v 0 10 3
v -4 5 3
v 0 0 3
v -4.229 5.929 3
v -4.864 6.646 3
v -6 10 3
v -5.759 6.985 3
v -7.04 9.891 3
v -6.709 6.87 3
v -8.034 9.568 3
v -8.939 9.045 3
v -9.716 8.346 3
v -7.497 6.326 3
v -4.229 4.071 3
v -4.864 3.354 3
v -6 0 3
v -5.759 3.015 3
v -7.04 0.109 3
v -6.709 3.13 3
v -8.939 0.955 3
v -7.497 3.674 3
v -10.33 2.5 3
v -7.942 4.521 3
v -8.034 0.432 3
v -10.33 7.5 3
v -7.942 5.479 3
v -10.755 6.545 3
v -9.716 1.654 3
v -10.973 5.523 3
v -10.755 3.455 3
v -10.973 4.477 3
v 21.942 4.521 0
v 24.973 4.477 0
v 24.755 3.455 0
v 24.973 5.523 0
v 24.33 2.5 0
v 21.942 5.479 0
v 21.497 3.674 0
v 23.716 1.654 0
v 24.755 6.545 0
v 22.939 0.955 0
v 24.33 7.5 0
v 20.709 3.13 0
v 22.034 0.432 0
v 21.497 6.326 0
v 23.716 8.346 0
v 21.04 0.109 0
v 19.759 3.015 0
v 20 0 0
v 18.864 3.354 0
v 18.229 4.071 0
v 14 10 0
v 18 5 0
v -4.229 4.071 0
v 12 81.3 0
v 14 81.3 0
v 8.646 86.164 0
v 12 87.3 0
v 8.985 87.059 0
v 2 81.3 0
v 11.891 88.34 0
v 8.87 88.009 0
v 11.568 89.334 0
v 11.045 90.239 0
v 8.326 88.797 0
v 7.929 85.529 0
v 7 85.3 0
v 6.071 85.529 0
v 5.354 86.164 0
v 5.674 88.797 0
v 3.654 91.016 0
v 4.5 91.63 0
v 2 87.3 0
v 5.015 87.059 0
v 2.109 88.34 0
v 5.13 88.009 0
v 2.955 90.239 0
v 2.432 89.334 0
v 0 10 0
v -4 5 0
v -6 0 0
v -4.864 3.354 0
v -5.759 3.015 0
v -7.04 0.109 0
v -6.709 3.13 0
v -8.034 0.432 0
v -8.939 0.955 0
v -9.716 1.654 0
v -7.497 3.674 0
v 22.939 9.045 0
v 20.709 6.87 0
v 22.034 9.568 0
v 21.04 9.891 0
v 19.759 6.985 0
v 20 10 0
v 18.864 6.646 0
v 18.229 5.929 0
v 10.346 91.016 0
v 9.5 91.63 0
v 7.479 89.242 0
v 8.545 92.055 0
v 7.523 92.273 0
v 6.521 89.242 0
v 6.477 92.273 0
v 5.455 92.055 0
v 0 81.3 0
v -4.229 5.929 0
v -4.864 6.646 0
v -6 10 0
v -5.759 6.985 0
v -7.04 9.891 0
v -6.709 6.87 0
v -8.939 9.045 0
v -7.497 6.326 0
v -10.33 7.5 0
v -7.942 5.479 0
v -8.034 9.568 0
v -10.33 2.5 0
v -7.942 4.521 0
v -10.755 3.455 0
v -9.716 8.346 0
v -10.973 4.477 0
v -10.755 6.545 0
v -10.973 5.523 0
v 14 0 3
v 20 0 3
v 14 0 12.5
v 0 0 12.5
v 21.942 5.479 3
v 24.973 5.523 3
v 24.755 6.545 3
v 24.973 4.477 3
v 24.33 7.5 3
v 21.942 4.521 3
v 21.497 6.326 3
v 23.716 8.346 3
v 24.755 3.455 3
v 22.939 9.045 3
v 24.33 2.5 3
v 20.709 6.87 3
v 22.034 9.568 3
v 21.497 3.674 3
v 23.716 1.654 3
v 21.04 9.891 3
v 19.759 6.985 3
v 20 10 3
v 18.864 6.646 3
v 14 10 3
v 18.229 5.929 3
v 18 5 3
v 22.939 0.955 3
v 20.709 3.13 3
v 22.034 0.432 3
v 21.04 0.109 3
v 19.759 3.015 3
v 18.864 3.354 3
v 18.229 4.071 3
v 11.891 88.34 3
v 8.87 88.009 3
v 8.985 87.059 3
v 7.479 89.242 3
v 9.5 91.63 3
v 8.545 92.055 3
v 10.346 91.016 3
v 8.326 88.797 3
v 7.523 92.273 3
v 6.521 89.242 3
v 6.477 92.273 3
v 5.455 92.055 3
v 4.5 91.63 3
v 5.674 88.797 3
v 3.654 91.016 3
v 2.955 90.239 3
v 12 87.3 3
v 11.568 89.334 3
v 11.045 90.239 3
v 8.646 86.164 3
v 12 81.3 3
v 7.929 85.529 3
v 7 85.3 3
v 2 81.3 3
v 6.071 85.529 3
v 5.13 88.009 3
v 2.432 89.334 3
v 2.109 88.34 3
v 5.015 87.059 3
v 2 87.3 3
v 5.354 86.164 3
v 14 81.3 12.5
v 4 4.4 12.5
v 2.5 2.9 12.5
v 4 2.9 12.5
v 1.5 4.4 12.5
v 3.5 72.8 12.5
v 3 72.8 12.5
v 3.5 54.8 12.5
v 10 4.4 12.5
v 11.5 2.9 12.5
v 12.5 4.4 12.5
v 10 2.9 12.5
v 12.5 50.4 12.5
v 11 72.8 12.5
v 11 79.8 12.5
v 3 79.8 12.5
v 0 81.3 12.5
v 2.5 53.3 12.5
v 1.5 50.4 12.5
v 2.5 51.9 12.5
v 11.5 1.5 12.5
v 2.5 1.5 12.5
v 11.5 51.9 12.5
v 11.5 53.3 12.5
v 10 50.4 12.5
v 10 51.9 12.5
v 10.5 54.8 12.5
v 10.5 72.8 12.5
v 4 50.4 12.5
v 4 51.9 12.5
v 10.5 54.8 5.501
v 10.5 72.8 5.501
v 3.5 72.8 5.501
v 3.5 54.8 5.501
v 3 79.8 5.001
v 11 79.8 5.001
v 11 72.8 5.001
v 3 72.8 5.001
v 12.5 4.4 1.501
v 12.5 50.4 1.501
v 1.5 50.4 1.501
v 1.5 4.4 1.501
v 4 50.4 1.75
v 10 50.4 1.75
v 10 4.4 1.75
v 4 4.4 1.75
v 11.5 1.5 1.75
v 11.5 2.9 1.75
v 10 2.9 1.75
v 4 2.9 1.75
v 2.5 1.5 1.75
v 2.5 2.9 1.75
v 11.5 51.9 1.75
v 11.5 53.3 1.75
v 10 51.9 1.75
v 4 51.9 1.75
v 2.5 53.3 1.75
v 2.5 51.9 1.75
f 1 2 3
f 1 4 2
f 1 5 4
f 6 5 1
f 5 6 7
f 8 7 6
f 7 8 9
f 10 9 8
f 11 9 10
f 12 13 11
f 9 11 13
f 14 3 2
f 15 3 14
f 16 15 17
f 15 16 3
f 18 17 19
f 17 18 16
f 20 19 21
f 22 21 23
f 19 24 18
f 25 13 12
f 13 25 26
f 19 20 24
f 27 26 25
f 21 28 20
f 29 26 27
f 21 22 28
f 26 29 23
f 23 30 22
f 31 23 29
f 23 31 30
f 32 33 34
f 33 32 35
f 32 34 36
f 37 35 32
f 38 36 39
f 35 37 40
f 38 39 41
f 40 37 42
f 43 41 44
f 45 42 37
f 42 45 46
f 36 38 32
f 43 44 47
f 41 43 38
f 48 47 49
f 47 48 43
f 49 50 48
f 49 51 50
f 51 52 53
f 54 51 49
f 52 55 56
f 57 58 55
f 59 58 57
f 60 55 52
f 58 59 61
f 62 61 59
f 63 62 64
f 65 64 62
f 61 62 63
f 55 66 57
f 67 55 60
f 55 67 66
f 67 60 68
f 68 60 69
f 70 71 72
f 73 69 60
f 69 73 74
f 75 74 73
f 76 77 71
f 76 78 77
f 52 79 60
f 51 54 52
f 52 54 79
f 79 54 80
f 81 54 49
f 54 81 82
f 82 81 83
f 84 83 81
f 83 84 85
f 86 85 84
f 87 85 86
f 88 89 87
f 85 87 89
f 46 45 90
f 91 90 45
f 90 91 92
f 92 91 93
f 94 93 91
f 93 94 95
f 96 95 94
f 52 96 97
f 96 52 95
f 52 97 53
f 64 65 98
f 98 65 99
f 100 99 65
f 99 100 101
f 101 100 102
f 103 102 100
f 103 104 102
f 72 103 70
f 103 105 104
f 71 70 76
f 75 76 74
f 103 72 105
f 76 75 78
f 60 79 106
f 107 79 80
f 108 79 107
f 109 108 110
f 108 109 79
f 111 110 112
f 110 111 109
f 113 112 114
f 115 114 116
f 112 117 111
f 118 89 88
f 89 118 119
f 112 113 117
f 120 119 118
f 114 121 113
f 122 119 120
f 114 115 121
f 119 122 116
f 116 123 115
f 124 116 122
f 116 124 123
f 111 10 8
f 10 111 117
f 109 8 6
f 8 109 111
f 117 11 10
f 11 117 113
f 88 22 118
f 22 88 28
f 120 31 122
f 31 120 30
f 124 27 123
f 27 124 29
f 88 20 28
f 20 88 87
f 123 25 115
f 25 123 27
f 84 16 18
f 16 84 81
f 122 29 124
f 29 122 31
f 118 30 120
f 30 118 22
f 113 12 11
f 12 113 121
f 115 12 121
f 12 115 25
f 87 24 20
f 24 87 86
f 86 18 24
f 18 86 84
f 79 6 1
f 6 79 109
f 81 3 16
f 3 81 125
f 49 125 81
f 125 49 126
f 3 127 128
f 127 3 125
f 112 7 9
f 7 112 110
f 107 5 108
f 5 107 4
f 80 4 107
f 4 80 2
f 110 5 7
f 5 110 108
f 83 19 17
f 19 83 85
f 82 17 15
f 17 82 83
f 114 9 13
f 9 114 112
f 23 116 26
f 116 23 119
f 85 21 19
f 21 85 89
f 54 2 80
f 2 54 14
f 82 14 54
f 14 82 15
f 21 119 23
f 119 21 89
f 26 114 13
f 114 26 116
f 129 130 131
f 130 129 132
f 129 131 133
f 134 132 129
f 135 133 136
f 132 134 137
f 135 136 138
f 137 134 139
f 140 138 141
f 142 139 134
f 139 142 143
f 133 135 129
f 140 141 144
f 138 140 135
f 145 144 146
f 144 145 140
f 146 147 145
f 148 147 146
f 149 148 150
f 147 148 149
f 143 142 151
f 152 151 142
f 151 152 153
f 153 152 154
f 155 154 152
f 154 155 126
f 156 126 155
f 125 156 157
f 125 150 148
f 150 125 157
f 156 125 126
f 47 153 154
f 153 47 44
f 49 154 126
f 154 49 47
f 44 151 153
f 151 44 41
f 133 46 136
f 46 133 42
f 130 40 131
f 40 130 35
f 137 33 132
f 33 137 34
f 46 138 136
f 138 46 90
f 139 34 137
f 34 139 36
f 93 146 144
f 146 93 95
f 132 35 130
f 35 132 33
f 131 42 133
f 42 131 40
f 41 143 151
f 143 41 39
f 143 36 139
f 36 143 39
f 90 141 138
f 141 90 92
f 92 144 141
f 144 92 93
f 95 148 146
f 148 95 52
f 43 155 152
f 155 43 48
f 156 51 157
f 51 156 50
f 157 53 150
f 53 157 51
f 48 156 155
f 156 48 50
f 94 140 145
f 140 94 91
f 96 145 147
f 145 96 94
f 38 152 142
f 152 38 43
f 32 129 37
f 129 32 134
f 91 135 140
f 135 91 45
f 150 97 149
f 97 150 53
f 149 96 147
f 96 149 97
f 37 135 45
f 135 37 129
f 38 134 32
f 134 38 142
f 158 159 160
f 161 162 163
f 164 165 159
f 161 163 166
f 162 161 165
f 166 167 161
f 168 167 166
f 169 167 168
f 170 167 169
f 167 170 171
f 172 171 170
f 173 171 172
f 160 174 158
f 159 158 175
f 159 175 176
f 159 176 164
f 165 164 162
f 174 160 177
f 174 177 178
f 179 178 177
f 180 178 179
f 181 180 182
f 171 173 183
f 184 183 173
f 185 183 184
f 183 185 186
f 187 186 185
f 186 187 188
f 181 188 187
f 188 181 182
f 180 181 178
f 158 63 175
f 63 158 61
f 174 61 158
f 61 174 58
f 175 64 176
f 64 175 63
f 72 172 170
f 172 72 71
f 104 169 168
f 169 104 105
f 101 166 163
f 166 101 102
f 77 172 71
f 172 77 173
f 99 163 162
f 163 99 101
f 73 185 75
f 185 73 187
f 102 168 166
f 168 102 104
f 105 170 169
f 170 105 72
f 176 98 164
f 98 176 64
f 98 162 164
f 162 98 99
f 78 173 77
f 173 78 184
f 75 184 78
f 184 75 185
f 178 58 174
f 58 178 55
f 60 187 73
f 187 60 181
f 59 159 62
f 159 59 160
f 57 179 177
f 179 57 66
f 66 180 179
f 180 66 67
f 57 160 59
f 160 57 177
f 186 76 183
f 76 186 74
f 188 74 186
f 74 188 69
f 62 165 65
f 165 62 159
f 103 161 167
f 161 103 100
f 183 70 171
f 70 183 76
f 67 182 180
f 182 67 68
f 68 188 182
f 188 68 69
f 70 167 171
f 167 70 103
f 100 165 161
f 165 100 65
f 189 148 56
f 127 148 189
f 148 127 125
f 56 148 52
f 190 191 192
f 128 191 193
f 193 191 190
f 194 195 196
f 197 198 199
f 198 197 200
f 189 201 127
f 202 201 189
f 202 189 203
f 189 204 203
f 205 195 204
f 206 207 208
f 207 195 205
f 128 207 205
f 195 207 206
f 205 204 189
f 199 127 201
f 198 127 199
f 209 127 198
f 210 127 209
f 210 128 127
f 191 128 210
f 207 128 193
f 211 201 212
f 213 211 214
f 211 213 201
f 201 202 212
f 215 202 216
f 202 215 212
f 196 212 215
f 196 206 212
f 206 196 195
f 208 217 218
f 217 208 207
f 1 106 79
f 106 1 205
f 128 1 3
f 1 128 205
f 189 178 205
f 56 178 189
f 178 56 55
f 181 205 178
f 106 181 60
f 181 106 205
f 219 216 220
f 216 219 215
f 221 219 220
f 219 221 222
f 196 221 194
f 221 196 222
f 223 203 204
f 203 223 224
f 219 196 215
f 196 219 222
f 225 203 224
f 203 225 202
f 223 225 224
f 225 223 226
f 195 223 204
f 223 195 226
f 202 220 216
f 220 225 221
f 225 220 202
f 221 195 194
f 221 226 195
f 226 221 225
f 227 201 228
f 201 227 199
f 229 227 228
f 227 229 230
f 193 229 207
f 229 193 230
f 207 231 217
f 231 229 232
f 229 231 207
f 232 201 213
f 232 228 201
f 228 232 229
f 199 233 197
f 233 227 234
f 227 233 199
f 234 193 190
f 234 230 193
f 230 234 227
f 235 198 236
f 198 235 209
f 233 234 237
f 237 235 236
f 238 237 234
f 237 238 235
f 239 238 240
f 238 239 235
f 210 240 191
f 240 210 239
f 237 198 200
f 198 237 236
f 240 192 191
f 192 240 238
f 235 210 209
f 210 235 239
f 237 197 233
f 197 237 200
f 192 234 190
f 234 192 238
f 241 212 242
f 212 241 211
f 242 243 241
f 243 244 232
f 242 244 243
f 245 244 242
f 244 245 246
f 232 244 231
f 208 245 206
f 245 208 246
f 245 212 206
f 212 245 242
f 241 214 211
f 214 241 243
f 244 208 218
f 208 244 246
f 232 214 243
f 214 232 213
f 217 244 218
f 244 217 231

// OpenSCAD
// file: common.scad
//include <RatsoShapeLibrary.scad>



/*
Define settings for each nut/bolt type here
*/

// ### layer height of the printer ###
printer_layer_height = 0.4;

// kludge factor for different print nozzles
printer_oversize = 0.5; // 0.35 nozzle use 0.3; 0.6 nozzle use 0.?
printer_oversizeArc = 0.2; // 0.35 nozzle = ???; 0.6 nozzle = 0.2


// ### M3 ###

M3_boltDiameter = 3.0 + printer_oversize; // actual 3.0
M3_boltDiameterArc = 3.0 + printer_oversizeArc; // used for rotary extruded bolt channel
M3_boltHeadDiameter = 6.0 + printer_oversize; // actual 6
M3_nutHeight = 2.4 + printer_oversize; // actual 2.4
M3_lockNutHeight = 4.0 + printer_oversize; // actual 4.0
M3_nutDiameterMin = 5.5 + printer_oversize; // actual 5.5
M3_nutDiameterMax = (5.5*(1/sin(60))) + printer_oversize; // actual 6
M3_nutDiameterArc = 5.5; // used for rotary extruded nut channel

// eventually standardize this interface??, that would allow for easy switching of bolt/nut sizes
M3_dim = [M3_boltDiameter,M3_nutDiameterMin,M3_nutDiameterMax,M3_nutHeight];


// ### M2 ###

M2_boltDiameter = 2.0 + printer_oversize; // actual 2.0
M2_boltHeadDiameter = 4.0 + printer_oversize; // actual 4
M2_nutHeight = 1.6 + printer_oversize; // actual 1.6
M2_nutDiameterMin = 3.8 + printer_oversize; // actual 4
M2_nutDiameterMax = (4.0*(1/sin(60))) + printer_oversize; // actual 4.5

// eventually standardize this interface??, that would allow for easy switching of bolt/nut sizes
M2_dim = [M2_boltDiameter,M2_nutDiameterMin,M2_nutDiameterMax,M2_nutHeight];

// ### M8 ###
M8_rodDiameter = 8 + printer_oversize;

// ### PI ###
pi = 3.14159265359;



// ### shaft sizes for tight fit ###
woodDowel_quarterInch_diameter = 7.1;
woodDowel_halfInch_diameter = 13.5;
stepperMotor_diameter = 5.0 + printer_oversize; // actual 5.0



//--------




// =========================================================

//trapNutDie(channelHeight=20, holeLength=50, holeOffset=15 );
//trapNutDie(channelHeight=0 ,holeLength=15, holeOffset=0, nutOffset=0 );
// ** this is a brand-new function
module trapNutDie(
	channelHeight=15, 
	holeLength=10, 
	holeOffset=0, 
	nutOffset=0, 
	boltHoleRes=12,
	boltRadius = M3_boltDiameter/2, // DEPRICATE
	mType = 0,
	boltDiameter = M3_boltDiameter,
	nutHeight = M3_nutHeight,
	nutDiameterMin = M3_nutDiameterMin,
	nutDiameterMax = M3_nutDiameterMax,
	horizontal = false // should add a support to the bolt hole, AND (###TODO###) make the nut height a little higher
	){

	if(!horizontal){
		// hex-hole for the nut
		translate([0,-(nutHeight/2),-nutOffset]) rotate([-90,30,0]) cylinder(r=nutDiameterMax/2, h=nutHeight, $fn=6);
		// channel the nut drops into
		translate([-nutDiameterMin/2,-(nutHeight/2),0]) cube([nutDiameterMin,nutHeight,channelHeight]);
	}else{
		// hex-hole for the nut
		translate([0,-(nutHeight/2),-nutOffset]) rotate([-90,30,0]) cylinder(r=nutDiameterMax/2, h=nutHeight+printer_layer_height, $fn=6);
		// channel the nut drops into
		translate([-nutDiameterMin/2,-(nutHeight/2),0]) cube([nutDiameterMin,nutHeight+printer_layer_height,channelHeight]);
	}

	difference(){
		// bolt hole
		translate([0,-(holeLength/2)+holeOffset,0]) rotate([-90,0,0]) cylinder(r=boltDiameter/2, h=holeLength, $fn=boltHoleRes);
		if(horizontal){
			// cutout slice for support (if horizontal)
			rotate([-90,0,0]) translate([0,0,(nutHeight/2)+0.001]) cylinder(r=(boltDiameter/2)+1, h=printer_layer_height*2);
		}
	}
	
}

// =================================

//stumpWithTrapNut(shaftDiameter=stepperMotor_diameter, stumpWallThick=6, nutBlockThick=12);
//stumpWithTrapNut(shaftDiameter=16 + printer_oversize ); // shaft collar for Chad's drum stand
//stumpWithTrapNut(shaftDiameter=woodDowel_halfInch_diameter, stumpWallThick=8, nutBlockThick=0);
//stumpWithTrapNut(shaftDiameter=woodDowel_quarterInch_diameter); // shaftDiameter was 7.3, but a little too loose


module stumpWithTrapNut(
	shaftDiameter = 7.3,
	stumpWallThick = 4,
	nutBlockThick = 8,
	){

	shaftRadius = shaftDiameter/2;
	stumpRadius = shaftRadius + stumpWallThick;
	stumpHeight = 10;

	nutBlockWidth = M3_nutDiameterMax+stumpWallThick;
	nutBlockOffsetY = stumpRadius + nutBlockThick - stumpWallThick;
	stumpTrapNutOffsetY = shaftRadius + ( max( stumpWallThick, nutBlockThick ) / 2.5 );  //nutBlockOffsetY - (nutBlockThick/2); //
	stumpTrapNutOffsetZ = stumpHeight/2;

	trapNutBoltHoleLength = max( nutBlockThick, stumpWallThick );

		// nut stump
			translate([0,0,0]) difference(){
				union(){
					// stump
					translate([0,0,0]) cylinder(r=stumpRadius, h=stumpHeight, center=false);
					// nut block
					translate([-nutBlockWidth/2,-nutBlockOffsetY,0]) cube([nutBlockWidth,nutBlockThick,stumpHeight]);
				}
				// motor shaft
				translate([0,0,(stumpHeight)/2]) cylinder(r=shaftRadius, h=stumpHeight+1, center=true, $fn=shaftDiameter*3);
				// trap nut
				rotate([0,0,0]) translate([0,-stumpTrapNutOffsetY, stumpHeight-stumpTrapNutOffsetZ]) rotate([0,0,0]) trapNutDie(channelHeight=10 ,holeLength=trapNutBoltHoleLength*2, holeOffset=(-trapNutBoltHoleLength)/2 ); //holeOffset=(length/2)+(r1/2)
			} // translate difference
}
// main file
include<RatsoShapeLibrary.scad>
include<common.scad>


bodyWallThick = 1.5;

aaaBatteryRadius = 5.5;
aaaBatteryLength = 46; // 44 for the battery + spring compression
aaaTerminalWidth = 9; // actual 8; width and height same
aaaTerminalThick = 1.4;
aaaTerminalTabWallWidth = 1.5; 
aaaTerminalTabWallThick = 1.5; 
//aaaTerminalTabThick = 1.5; // how thick the tab needs, though it does compress
//aaaTerminalTabOffset = 3; // from the edge

motorBodyDiameter = 7.0; // actual 7.0
motorBodyLength = 18; 
motorShaftDiameter = 8; // includes weight, etc. - total clearance
motorShaftLength = 7; // again, total clearance
motorOverallLength = motorBodyLength + motorShaftLength;


mountRingOR = 5;
mountRingIR = 2;
caseMountLoopHeight = 3;
caseMountLoopOffsetX = 6;
caseMountLoopOffsetY = mountRingOR;

vibroBotBodySizeOuter = [ 
	(aaaBatteryRadius*2)+(bodyWallThick*2), 
	bodyWallThick+aaaTerminalThick+aaaTerminalTabWallThick+aaaBatteryLength+aaaTerminalThick+aaaTerminalTabWallThick+bodyWallThick+motorOverallLength+bodyWallThick, 
	(aaaBatteryRadius*2)+(bodyWallThick*1) 
];
batteryCutoutSize = [ (aaaBatteryRadius*2), aaaBatteryLength, (aaaBatteryRadius*2) ];
motorCutoutSize = [ motorBodyDiameter, motorOverallLength, motorBodyDiameter ];
motorShaftCutoutSize = [ motorShaftDiameter, motorShaftLength, motorShaftDiameter ];


wireDiameter = 2;
boltDiameter = 3.8;
wireLockBlockSize = [10,10,10];

wireHoleOffsetY = 7;
trapNutOffsetY = 3.5;


$fs=1;


// ================================

vibroBotBody();
//wireLockBlock();

// ===================================


module vibroBotBody(){
		//
		openingWidth = aaaTerminalWidth-(aaaTerminalTabWallWidth*2);
	//	
	union(){
	difference(){
		union(){
			cube(vibroBotBodySizeOuter);
			// the mount holes // ring(od, id, height) 
			translate([ 0, caseMountLoopOffsetY, 0 ]) makeCaseLoop();
			translate([  vibroBotBodySizeOuter[0], caseMountLoopOffsetY, 0 ]) rotate([0,0,180]) makeCaseLoop();
			translate([ (vibroBotBodySizeOuter[0]/2), vibroBotBodySizeOuter[1], 0 ]) rotate([0,0,-90]) makeCaseLoop();
			//translate([  vibroBotBodySizeOuter[0], vibroBotBodySizeOuter[1], 0 ]) rotate([0,0,180]) makeCaseLoop();
		}//union - main body

		// cutout for battery
		translate([bodyWallThick,bodyWallThick+aaaTerminalThick+aaaTerminalTabWallThick,bodyWallThick+0.001]) cube(batteryCutoutSize);
		// cutout for motor
		translate([ (vibroBotBodySizeOuter[0]-motorBodyDiameter)/2, bodyWallThick+aaaTerminalThick+aaaTerminalTabWallThick+batteryCutoutSize[1]+aaaTerminalThick+aaaTerminalTabWallThick+bodyWallThick, vibroBotBodySizeOuter[2]-motorCutoutSize[2]+0.001]) {
			cube(motorCutoutSize);
			// cutout for the motor shaft (the vibration weight)
			translate([-(motorShaftDiameter-motorBodyDiameter)/2,motorBodyLength,-(motorShaftDiameter-motorBodyDiameter)/2]) cube(motorShaftCutoutSize);
		}
		
		// cutout for battery terminals
		translate([ (vibroBotBodySizeOuter[0]-aaaTerminalWidth)/2, bodyWallThick, (vibroBotBodySizeOuter[2]-aaaTerminalWidth)/2 ]) cube([ aaaTerminalWidth, aaaTerminalThick, aaaTerminalWidth*2 ]);
		translate([ (vibroBotBodySizeOuter[0]-openingWidth)/2, bodyWallThick+aaaTerminalThick-0.01, (vibroBotBodySizeOuter[2]-aaaTerminalWidth)/2 ]) cube([ openingWidth, aaaTerminalTabWallThick+0.02, aaaTerminalWidth*2 ]);
		
		translate([ (vibroBotBodySizeOuter[0]-aaaTerminalWidth)/2, bodyWallThick+aaaTerminalThick+aaaTerminalTabWallThick+batteryCutoutSize[1]+aaaTerminalTabWallThick, (vibroBotBodySizeOuter[2]-aaaTerminalWidth)/2 ]) cube([ aaaTerminalWidth, aaaTerminalThick, aaaTerminalWidth*2 ]);
		translate([ (vibroBotBodySizeOuter[0]-openingWidth)/2, bodyWallThick+aaaTerminalThick+aaaTerminalTabWallThick+batteryCutoutSize[1]-0.01, (vibroBotBodySizeOuter[2]-aaaTerminalWidth)/2 ]) cube([ openingWidth, aaaTerminalTabWallThick+0.02, aaaTerminalWidth*2 ]);
		
		
	} // difference


	
	} // union
}


module makeCaseLoop(){
	difference(){
		translate([mountRingOR,0,0]) rotate([0,0,90]) cam( mountRingOR, mountRingOR, caseMountLoopOffsetX+(mountRingOR), caseMountLoopHeight );
		translate([-caseMountLoopOffsetX,0,-1]) cylinder(r=mountRingIR, h=caseMountLoopHeight+2);
	}
}


module wireLockBlock( wireRad=wireDiameter/2, boltRad=boltDiameter/2 ){
	difference(){
		cube(wireLockBlockSize);
		translate([ wireLockBlockSize[0]/2, wireHoleOffsetY, -1 ]) cylinder(r=wireRad, h=wireLockBlockSize[2]+2);
		translate([ wireLockBlockSize[0]/2, trapNutOffsetY, wireLockBlockSize[2]/2 ]) trapNutDie(channelHeight=wireLockBlockSize[2]);
	}
}


/*
module miniCaseBoltBlock(boosterHeight=3){
	blockUnderDepth = boosterHeight;

	translate([0,0,blockUnderDepth+(nutBlockDepth/2)]){
			union(){
				rotate([ 90,0,180 ]) difference() {
					union() translate([ -(nutBlockWidth/2), -(nutBlockDepth/2), 0 ]) {				
						// nut block body
						translate([0,0,0.01]) cube([ nutBlockWidth, nutBlockDepth, nutBlockHeight ]); // the nut-block
						// under block
						if(blockUnderDepth>0){translate([0,-blockUnderDepth+0.01,0.01]) cube([nutBlockWidth,blockUnderDepth,nutBlockHeight]);}
					}//union
					// trap-nut 
					translate([ 0, 0, panelBoltHoleEdgeOffset ]) trapNutDie( holeLength=(nutBlockDepth+blockUnderDepth+0.01), nutHeight=nutHoleHeightHoriz );
				} rotate() difference()
				// support for the bolt-hole
				translate([0,(nutBlockHeight/2), (nutHoleHeightHoriz/2)]) cylinder(r=(boltDiameter/2)+0.1, h=boltHoleSupportThick);
			}// union
	}// translate
}
*/
